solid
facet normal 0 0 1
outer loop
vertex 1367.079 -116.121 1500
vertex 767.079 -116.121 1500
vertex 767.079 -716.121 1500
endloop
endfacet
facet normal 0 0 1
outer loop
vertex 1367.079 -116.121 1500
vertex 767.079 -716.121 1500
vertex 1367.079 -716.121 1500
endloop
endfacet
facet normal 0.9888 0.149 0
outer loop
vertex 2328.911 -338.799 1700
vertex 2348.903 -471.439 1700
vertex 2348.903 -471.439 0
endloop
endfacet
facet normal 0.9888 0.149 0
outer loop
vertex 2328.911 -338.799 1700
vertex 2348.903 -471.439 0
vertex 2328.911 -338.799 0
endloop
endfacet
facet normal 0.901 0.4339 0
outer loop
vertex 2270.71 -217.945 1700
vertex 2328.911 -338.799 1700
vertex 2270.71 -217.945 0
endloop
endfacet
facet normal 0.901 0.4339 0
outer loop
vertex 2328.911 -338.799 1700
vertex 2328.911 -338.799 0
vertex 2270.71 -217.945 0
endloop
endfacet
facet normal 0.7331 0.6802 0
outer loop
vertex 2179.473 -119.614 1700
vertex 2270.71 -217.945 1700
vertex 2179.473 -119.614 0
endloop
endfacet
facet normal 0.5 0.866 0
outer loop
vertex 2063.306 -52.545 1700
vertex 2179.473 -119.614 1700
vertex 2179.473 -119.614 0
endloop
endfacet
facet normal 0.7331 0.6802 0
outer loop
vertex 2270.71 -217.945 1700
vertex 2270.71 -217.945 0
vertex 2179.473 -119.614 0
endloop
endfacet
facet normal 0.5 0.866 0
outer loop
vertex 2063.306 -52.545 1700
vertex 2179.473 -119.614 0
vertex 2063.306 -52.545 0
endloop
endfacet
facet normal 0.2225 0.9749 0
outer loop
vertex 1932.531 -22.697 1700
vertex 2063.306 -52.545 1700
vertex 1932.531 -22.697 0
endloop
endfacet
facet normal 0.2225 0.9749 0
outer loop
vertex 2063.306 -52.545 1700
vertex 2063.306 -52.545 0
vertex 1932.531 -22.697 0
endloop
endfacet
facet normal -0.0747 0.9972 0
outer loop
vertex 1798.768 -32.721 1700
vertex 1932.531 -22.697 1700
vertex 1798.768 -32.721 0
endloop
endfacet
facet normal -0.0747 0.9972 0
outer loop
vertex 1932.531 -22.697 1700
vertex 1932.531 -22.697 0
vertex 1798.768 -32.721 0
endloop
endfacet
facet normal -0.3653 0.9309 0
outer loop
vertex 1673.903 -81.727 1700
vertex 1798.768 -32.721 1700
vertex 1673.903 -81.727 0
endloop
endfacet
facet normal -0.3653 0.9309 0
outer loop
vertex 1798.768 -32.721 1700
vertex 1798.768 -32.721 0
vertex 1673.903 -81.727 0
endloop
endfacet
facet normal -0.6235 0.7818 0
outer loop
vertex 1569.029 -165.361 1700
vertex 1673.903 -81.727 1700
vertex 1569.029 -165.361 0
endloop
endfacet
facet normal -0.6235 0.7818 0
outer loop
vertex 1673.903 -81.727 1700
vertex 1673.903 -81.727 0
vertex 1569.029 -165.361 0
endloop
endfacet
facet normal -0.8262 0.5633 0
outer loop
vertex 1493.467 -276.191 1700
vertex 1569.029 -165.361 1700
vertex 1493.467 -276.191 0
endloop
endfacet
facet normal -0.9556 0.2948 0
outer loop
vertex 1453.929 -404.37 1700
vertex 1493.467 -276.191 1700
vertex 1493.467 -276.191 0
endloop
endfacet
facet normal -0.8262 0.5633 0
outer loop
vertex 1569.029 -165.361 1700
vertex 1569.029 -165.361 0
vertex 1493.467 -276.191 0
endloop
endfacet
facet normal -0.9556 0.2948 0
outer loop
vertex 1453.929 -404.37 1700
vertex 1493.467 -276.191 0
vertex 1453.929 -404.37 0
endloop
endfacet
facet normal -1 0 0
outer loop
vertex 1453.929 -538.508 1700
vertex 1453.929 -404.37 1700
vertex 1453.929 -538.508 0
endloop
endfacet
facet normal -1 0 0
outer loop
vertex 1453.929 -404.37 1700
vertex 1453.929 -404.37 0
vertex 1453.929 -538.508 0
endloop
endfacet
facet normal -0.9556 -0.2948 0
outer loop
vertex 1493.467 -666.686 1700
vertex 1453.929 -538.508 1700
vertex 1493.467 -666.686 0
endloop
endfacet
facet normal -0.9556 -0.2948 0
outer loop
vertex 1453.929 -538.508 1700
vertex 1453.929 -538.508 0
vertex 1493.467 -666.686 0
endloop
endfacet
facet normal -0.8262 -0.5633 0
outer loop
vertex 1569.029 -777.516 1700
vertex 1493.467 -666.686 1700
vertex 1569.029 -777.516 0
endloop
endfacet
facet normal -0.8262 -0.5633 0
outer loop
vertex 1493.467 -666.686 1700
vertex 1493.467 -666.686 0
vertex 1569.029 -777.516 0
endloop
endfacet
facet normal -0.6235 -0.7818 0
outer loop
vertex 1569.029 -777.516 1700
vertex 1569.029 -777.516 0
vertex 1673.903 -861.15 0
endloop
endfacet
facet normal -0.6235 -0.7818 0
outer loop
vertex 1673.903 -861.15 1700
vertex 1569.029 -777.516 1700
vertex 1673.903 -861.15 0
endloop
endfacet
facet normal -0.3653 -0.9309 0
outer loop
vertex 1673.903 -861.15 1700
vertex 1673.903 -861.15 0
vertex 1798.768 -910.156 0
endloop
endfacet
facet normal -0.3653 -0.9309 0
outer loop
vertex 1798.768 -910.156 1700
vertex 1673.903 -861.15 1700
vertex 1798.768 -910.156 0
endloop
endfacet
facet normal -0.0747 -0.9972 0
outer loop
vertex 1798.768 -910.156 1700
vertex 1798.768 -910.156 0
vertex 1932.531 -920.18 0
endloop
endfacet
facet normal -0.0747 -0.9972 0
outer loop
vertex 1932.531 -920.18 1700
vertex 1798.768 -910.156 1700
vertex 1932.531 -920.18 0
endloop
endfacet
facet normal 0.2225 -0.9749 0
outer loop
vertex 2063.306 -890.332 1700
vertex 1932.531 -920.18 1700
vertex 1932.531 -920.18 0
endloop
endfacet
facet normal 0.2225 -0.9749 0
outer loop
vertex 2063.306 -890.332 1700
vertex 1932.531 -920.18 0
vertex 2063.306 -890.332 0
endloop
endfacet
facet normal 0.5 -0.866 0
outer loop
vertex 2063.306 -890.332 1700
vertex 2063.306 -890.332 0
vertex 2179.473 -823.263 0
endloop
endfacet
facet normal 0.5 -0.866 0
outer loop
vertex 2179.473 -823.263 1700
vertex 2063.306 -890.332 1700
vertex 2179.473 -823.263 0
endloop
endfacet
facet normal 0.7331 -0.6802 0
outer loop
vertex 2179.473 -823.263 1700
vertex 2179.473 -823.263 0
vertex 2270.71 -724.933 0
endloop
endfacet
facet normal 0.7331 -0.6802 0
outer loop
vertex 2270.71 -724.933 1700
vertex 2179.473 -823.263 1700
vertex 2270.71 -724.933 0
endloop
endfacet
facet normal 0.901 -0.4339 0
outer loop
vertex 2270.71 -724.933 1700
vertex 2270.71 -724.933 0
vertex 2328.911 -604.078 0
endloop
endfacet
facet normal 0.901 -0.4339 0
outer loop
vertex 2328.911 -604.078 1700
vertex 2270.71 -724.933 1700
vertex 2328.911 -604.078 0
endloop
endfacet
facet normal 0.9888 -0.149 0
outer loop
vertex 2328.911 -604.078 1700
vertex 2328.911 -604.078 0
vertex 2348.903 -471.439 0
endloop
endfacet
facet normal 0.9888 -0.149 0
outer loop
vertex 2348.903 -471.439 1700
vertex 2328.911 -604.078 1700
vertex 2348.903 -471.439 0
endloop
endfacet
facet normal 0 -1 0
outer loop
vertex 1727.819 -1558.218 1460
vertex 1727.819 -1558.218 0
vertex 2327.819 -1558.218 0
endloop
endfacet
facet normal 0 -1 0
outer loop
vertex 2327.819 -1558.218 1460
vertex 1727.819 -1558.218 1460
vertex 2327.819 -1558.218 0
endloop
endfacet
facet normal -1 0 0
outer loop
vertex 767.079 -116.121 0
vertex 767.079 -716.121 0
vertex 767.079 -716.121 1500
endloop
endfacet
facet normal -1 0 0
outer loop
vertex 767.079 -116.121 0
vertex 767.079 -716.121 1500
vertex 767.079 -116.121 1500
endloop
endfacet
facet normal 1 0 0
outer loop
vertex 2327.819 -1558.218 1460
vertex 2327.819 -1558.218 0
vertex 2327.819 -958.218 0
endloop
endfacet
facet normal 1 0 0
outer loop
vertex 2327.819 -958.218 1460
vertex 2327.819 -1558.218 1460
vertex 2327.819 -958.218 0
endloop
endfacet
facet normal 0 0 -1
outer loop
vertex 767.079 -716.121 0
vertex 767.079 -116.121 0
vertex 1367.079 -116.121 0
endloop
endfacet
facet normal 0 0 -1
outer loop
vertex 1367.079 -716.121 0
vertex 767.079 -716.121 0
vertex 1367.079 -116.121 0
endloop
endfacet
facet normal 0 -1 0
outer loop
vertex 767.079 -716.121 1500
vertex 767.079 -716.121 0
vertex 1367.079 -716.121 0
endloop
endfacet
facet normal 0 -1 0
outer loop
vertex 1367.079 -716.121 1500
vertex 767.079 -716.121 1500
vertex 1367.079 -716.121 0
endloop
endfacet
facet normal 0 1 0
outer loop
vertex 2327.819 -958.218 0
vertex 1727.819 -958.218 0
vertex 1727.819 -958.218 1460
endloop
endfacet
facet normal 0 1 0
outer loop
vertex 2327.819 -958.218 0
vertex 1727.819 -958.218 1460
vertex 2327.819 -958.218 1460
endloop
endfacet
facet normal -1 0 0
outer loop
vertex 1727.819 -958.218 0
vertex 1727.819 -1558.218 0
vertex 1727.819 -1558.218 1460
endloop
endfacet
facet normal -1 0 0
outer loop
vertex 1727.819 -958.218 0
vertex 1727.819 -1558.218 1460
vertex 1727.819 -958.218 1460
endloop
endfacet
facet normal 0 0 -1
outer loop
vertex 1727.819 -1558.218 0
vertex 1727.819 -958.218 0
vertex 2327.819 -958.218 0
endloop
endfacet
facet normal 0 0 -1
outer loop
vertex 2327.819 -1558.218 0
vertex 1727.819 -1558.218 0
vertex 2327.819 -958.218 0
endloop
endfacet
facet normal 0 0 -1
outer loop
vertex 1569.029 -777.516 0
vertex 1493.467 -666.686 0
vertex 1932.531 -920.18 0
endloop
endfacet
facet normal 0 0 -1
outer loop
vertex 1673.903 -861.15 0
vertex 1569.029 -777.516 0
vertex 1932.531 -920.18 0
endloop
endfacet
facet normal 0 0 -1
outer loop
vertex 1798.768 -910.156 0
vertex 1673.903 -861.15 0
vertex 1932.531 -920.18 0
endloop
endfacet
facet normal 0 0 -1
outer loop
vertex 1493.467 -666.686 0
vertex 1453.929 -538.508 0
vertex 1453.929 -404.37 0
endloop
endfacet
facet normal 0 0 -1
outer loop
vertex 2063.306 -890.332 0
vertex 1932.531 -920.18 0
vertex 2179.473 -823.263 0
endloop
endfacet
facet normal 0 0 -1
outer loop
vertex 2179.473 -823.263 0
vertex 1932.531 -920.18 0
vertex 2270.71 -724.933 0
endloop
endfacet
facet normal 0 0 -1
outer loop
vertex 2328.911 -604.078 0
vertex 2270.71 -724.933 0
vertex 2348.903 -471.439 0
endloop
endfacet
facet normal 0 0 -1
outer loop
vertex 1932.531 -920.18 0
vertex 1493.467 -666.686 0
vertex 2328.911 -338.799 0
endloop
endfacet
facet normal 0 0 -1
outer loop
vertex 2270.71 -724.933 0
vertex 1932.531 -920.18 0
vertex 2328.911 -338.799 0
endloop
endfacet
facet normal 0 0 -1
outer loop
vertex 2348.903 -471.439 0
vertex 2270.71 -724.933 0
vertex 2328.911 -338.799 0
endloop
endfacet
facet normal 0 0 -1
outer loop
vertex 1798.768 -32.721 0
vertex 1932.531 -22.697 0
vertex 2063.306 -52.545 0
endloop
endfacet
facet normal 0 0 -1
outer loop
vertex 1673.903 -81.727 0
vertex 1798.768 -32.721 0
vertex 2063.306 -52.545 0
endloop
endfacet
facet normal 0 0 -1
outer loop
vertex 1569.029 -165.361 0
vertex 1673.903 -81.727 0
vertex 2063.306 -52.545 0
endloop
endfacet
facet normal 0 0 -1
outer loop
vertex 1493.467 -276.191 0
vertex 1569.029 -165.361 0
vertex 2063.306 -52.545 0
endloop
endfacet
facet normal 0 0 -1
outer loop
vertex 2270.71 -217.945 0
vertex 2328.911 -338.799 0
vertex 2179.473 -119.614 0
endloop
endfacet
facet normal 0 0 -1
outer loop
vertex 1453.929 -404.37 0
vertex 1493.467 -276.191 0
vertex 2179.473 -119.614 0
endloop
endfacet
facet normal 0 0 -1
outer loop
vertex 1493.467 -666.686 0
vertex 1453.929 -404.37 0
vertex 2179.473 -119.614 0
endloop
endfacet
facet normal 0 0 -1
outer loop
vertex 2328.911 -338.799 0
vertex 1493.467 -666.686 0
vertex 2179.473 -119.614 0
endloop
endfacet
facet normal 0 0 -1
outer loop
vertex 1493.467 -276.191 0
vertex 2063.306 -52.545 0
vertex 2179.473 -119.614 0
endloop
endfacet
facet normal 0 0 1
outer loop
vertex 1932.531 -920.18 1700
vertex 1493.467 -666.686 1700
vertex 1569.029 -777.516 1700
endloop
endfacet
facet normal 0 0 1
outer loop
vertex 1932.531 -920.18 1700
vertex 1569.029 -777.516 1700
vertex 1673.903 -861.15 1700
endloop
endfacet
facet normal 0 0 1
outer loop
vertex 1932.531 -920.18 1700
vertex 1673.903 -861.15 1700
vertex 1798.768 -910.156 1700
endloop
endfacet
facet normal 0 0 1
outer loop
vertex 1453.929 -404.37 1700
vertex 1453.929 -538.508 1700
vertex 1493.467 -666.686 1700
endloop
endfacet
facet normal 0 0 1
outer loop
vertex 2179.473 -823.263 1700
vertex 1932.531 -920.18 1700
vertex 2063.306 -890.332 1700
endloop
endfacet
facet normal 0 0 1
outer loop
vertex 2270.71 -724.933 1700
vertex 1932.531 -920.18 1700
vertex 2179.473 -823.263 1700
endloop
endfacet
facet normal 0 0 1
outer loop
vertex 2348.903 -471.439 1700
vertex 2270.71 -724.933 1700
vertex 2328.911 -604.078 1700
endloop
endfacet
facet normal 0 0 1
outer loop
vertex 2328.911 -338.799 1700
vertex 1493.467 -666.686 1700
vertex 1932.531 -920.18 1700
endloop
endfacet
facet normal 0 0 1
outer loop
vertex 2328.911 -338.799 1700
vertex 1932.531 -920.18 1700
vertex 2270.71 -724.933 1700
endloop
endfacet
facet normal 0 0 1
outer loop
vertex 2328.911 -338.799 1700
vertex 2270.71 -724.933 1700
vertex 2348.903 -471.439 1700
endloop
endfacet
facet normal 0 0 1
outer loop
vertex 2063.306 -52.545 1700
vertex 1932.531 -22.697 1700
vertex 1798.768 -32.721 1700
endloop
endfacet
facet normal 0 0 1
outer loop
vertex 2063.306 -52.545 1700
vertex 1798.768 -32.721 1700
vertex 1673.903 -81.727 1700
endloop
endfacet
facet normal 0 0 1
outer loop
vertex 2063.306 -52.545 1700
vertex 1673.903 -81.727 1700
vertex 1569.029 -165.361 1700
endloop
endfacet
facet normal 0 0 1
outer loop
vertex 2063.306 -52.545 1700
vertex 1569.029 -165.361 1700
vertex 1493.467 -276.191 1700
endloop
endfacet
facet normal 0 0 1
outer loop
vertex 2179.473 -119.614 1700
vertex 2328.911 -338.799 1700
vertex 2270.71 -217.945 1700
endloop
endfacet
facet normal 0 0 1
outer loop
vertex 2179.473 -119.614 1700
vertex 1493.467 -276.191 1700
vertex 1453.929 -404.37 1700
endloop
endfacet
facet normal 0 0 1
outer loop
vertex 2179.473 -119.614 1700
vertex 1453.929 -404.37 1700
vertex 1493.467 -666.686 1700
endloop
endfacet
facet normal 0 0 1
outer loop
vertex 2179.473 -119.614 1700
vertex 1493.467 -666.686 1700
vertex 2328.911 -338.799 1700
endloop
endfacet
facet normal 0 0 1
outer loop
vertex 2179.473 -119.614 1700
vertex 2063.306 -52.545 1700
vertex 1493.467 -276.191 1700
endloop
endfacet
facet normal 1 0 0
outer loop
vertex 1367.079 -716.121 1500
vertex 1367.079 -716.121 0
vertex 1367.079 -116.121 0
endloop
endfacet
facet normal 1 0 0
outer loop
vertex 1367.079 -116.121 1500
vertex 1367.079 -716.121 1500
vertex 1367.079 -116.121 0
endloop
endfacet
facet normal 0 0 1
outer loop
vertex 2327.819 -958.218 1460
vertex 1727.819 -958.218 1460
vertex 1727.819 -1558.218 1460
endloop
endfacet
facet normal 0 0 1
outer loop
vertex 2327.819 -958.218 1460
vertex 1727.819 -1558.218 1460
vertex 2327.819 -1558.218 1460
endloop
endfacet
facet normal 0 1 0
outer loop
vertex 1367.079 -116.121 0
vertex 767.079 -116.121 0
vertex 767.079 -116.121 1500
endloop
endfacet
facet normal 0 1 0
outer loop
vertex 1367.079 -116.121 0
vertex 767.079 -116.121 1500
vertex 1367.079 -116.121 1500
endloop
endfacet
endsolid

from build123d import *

# Parameters (mm, degrees)
F3_W     = 600
F3_H     = 600
F4_DEPTH = 1500
F1_R     = 450
F5_DEPTH = 1700
F1_W     = 600
F1_H     = 600
F6_DEPTH = 1460


with BuildPart() as f4:
    # F3 (on face) → F4 (new body)
    with BuildSketch(Plane.XY):
        with Locations((1067.079276, -416.121305)):
            Rectangle(F3_W, F3_H)
    extrude(amount=F4_DEPTH)


with BuildPart() as f5:
    # F1 (on Top) → F5 (new body)
    with BuildSketch(Plane.XY):
        with Locations((1898.902834, -471.438546)):
            Circle(F1_R)
    extrude(amount=F5_DEPTH)

    # F1 (on Top) → F6 (join)
    with BuildSketch(Plane.XY):
        with Locations((1898.902834, -471.438546)):
            Circle(F1_R)
        with Locations((2027.818871, -1258.218098)):
            Rectangle(F1_W, F1_H)
    extrude(amount=F6_DEPTH)


solid = Compound([f4.part, f5.part])
